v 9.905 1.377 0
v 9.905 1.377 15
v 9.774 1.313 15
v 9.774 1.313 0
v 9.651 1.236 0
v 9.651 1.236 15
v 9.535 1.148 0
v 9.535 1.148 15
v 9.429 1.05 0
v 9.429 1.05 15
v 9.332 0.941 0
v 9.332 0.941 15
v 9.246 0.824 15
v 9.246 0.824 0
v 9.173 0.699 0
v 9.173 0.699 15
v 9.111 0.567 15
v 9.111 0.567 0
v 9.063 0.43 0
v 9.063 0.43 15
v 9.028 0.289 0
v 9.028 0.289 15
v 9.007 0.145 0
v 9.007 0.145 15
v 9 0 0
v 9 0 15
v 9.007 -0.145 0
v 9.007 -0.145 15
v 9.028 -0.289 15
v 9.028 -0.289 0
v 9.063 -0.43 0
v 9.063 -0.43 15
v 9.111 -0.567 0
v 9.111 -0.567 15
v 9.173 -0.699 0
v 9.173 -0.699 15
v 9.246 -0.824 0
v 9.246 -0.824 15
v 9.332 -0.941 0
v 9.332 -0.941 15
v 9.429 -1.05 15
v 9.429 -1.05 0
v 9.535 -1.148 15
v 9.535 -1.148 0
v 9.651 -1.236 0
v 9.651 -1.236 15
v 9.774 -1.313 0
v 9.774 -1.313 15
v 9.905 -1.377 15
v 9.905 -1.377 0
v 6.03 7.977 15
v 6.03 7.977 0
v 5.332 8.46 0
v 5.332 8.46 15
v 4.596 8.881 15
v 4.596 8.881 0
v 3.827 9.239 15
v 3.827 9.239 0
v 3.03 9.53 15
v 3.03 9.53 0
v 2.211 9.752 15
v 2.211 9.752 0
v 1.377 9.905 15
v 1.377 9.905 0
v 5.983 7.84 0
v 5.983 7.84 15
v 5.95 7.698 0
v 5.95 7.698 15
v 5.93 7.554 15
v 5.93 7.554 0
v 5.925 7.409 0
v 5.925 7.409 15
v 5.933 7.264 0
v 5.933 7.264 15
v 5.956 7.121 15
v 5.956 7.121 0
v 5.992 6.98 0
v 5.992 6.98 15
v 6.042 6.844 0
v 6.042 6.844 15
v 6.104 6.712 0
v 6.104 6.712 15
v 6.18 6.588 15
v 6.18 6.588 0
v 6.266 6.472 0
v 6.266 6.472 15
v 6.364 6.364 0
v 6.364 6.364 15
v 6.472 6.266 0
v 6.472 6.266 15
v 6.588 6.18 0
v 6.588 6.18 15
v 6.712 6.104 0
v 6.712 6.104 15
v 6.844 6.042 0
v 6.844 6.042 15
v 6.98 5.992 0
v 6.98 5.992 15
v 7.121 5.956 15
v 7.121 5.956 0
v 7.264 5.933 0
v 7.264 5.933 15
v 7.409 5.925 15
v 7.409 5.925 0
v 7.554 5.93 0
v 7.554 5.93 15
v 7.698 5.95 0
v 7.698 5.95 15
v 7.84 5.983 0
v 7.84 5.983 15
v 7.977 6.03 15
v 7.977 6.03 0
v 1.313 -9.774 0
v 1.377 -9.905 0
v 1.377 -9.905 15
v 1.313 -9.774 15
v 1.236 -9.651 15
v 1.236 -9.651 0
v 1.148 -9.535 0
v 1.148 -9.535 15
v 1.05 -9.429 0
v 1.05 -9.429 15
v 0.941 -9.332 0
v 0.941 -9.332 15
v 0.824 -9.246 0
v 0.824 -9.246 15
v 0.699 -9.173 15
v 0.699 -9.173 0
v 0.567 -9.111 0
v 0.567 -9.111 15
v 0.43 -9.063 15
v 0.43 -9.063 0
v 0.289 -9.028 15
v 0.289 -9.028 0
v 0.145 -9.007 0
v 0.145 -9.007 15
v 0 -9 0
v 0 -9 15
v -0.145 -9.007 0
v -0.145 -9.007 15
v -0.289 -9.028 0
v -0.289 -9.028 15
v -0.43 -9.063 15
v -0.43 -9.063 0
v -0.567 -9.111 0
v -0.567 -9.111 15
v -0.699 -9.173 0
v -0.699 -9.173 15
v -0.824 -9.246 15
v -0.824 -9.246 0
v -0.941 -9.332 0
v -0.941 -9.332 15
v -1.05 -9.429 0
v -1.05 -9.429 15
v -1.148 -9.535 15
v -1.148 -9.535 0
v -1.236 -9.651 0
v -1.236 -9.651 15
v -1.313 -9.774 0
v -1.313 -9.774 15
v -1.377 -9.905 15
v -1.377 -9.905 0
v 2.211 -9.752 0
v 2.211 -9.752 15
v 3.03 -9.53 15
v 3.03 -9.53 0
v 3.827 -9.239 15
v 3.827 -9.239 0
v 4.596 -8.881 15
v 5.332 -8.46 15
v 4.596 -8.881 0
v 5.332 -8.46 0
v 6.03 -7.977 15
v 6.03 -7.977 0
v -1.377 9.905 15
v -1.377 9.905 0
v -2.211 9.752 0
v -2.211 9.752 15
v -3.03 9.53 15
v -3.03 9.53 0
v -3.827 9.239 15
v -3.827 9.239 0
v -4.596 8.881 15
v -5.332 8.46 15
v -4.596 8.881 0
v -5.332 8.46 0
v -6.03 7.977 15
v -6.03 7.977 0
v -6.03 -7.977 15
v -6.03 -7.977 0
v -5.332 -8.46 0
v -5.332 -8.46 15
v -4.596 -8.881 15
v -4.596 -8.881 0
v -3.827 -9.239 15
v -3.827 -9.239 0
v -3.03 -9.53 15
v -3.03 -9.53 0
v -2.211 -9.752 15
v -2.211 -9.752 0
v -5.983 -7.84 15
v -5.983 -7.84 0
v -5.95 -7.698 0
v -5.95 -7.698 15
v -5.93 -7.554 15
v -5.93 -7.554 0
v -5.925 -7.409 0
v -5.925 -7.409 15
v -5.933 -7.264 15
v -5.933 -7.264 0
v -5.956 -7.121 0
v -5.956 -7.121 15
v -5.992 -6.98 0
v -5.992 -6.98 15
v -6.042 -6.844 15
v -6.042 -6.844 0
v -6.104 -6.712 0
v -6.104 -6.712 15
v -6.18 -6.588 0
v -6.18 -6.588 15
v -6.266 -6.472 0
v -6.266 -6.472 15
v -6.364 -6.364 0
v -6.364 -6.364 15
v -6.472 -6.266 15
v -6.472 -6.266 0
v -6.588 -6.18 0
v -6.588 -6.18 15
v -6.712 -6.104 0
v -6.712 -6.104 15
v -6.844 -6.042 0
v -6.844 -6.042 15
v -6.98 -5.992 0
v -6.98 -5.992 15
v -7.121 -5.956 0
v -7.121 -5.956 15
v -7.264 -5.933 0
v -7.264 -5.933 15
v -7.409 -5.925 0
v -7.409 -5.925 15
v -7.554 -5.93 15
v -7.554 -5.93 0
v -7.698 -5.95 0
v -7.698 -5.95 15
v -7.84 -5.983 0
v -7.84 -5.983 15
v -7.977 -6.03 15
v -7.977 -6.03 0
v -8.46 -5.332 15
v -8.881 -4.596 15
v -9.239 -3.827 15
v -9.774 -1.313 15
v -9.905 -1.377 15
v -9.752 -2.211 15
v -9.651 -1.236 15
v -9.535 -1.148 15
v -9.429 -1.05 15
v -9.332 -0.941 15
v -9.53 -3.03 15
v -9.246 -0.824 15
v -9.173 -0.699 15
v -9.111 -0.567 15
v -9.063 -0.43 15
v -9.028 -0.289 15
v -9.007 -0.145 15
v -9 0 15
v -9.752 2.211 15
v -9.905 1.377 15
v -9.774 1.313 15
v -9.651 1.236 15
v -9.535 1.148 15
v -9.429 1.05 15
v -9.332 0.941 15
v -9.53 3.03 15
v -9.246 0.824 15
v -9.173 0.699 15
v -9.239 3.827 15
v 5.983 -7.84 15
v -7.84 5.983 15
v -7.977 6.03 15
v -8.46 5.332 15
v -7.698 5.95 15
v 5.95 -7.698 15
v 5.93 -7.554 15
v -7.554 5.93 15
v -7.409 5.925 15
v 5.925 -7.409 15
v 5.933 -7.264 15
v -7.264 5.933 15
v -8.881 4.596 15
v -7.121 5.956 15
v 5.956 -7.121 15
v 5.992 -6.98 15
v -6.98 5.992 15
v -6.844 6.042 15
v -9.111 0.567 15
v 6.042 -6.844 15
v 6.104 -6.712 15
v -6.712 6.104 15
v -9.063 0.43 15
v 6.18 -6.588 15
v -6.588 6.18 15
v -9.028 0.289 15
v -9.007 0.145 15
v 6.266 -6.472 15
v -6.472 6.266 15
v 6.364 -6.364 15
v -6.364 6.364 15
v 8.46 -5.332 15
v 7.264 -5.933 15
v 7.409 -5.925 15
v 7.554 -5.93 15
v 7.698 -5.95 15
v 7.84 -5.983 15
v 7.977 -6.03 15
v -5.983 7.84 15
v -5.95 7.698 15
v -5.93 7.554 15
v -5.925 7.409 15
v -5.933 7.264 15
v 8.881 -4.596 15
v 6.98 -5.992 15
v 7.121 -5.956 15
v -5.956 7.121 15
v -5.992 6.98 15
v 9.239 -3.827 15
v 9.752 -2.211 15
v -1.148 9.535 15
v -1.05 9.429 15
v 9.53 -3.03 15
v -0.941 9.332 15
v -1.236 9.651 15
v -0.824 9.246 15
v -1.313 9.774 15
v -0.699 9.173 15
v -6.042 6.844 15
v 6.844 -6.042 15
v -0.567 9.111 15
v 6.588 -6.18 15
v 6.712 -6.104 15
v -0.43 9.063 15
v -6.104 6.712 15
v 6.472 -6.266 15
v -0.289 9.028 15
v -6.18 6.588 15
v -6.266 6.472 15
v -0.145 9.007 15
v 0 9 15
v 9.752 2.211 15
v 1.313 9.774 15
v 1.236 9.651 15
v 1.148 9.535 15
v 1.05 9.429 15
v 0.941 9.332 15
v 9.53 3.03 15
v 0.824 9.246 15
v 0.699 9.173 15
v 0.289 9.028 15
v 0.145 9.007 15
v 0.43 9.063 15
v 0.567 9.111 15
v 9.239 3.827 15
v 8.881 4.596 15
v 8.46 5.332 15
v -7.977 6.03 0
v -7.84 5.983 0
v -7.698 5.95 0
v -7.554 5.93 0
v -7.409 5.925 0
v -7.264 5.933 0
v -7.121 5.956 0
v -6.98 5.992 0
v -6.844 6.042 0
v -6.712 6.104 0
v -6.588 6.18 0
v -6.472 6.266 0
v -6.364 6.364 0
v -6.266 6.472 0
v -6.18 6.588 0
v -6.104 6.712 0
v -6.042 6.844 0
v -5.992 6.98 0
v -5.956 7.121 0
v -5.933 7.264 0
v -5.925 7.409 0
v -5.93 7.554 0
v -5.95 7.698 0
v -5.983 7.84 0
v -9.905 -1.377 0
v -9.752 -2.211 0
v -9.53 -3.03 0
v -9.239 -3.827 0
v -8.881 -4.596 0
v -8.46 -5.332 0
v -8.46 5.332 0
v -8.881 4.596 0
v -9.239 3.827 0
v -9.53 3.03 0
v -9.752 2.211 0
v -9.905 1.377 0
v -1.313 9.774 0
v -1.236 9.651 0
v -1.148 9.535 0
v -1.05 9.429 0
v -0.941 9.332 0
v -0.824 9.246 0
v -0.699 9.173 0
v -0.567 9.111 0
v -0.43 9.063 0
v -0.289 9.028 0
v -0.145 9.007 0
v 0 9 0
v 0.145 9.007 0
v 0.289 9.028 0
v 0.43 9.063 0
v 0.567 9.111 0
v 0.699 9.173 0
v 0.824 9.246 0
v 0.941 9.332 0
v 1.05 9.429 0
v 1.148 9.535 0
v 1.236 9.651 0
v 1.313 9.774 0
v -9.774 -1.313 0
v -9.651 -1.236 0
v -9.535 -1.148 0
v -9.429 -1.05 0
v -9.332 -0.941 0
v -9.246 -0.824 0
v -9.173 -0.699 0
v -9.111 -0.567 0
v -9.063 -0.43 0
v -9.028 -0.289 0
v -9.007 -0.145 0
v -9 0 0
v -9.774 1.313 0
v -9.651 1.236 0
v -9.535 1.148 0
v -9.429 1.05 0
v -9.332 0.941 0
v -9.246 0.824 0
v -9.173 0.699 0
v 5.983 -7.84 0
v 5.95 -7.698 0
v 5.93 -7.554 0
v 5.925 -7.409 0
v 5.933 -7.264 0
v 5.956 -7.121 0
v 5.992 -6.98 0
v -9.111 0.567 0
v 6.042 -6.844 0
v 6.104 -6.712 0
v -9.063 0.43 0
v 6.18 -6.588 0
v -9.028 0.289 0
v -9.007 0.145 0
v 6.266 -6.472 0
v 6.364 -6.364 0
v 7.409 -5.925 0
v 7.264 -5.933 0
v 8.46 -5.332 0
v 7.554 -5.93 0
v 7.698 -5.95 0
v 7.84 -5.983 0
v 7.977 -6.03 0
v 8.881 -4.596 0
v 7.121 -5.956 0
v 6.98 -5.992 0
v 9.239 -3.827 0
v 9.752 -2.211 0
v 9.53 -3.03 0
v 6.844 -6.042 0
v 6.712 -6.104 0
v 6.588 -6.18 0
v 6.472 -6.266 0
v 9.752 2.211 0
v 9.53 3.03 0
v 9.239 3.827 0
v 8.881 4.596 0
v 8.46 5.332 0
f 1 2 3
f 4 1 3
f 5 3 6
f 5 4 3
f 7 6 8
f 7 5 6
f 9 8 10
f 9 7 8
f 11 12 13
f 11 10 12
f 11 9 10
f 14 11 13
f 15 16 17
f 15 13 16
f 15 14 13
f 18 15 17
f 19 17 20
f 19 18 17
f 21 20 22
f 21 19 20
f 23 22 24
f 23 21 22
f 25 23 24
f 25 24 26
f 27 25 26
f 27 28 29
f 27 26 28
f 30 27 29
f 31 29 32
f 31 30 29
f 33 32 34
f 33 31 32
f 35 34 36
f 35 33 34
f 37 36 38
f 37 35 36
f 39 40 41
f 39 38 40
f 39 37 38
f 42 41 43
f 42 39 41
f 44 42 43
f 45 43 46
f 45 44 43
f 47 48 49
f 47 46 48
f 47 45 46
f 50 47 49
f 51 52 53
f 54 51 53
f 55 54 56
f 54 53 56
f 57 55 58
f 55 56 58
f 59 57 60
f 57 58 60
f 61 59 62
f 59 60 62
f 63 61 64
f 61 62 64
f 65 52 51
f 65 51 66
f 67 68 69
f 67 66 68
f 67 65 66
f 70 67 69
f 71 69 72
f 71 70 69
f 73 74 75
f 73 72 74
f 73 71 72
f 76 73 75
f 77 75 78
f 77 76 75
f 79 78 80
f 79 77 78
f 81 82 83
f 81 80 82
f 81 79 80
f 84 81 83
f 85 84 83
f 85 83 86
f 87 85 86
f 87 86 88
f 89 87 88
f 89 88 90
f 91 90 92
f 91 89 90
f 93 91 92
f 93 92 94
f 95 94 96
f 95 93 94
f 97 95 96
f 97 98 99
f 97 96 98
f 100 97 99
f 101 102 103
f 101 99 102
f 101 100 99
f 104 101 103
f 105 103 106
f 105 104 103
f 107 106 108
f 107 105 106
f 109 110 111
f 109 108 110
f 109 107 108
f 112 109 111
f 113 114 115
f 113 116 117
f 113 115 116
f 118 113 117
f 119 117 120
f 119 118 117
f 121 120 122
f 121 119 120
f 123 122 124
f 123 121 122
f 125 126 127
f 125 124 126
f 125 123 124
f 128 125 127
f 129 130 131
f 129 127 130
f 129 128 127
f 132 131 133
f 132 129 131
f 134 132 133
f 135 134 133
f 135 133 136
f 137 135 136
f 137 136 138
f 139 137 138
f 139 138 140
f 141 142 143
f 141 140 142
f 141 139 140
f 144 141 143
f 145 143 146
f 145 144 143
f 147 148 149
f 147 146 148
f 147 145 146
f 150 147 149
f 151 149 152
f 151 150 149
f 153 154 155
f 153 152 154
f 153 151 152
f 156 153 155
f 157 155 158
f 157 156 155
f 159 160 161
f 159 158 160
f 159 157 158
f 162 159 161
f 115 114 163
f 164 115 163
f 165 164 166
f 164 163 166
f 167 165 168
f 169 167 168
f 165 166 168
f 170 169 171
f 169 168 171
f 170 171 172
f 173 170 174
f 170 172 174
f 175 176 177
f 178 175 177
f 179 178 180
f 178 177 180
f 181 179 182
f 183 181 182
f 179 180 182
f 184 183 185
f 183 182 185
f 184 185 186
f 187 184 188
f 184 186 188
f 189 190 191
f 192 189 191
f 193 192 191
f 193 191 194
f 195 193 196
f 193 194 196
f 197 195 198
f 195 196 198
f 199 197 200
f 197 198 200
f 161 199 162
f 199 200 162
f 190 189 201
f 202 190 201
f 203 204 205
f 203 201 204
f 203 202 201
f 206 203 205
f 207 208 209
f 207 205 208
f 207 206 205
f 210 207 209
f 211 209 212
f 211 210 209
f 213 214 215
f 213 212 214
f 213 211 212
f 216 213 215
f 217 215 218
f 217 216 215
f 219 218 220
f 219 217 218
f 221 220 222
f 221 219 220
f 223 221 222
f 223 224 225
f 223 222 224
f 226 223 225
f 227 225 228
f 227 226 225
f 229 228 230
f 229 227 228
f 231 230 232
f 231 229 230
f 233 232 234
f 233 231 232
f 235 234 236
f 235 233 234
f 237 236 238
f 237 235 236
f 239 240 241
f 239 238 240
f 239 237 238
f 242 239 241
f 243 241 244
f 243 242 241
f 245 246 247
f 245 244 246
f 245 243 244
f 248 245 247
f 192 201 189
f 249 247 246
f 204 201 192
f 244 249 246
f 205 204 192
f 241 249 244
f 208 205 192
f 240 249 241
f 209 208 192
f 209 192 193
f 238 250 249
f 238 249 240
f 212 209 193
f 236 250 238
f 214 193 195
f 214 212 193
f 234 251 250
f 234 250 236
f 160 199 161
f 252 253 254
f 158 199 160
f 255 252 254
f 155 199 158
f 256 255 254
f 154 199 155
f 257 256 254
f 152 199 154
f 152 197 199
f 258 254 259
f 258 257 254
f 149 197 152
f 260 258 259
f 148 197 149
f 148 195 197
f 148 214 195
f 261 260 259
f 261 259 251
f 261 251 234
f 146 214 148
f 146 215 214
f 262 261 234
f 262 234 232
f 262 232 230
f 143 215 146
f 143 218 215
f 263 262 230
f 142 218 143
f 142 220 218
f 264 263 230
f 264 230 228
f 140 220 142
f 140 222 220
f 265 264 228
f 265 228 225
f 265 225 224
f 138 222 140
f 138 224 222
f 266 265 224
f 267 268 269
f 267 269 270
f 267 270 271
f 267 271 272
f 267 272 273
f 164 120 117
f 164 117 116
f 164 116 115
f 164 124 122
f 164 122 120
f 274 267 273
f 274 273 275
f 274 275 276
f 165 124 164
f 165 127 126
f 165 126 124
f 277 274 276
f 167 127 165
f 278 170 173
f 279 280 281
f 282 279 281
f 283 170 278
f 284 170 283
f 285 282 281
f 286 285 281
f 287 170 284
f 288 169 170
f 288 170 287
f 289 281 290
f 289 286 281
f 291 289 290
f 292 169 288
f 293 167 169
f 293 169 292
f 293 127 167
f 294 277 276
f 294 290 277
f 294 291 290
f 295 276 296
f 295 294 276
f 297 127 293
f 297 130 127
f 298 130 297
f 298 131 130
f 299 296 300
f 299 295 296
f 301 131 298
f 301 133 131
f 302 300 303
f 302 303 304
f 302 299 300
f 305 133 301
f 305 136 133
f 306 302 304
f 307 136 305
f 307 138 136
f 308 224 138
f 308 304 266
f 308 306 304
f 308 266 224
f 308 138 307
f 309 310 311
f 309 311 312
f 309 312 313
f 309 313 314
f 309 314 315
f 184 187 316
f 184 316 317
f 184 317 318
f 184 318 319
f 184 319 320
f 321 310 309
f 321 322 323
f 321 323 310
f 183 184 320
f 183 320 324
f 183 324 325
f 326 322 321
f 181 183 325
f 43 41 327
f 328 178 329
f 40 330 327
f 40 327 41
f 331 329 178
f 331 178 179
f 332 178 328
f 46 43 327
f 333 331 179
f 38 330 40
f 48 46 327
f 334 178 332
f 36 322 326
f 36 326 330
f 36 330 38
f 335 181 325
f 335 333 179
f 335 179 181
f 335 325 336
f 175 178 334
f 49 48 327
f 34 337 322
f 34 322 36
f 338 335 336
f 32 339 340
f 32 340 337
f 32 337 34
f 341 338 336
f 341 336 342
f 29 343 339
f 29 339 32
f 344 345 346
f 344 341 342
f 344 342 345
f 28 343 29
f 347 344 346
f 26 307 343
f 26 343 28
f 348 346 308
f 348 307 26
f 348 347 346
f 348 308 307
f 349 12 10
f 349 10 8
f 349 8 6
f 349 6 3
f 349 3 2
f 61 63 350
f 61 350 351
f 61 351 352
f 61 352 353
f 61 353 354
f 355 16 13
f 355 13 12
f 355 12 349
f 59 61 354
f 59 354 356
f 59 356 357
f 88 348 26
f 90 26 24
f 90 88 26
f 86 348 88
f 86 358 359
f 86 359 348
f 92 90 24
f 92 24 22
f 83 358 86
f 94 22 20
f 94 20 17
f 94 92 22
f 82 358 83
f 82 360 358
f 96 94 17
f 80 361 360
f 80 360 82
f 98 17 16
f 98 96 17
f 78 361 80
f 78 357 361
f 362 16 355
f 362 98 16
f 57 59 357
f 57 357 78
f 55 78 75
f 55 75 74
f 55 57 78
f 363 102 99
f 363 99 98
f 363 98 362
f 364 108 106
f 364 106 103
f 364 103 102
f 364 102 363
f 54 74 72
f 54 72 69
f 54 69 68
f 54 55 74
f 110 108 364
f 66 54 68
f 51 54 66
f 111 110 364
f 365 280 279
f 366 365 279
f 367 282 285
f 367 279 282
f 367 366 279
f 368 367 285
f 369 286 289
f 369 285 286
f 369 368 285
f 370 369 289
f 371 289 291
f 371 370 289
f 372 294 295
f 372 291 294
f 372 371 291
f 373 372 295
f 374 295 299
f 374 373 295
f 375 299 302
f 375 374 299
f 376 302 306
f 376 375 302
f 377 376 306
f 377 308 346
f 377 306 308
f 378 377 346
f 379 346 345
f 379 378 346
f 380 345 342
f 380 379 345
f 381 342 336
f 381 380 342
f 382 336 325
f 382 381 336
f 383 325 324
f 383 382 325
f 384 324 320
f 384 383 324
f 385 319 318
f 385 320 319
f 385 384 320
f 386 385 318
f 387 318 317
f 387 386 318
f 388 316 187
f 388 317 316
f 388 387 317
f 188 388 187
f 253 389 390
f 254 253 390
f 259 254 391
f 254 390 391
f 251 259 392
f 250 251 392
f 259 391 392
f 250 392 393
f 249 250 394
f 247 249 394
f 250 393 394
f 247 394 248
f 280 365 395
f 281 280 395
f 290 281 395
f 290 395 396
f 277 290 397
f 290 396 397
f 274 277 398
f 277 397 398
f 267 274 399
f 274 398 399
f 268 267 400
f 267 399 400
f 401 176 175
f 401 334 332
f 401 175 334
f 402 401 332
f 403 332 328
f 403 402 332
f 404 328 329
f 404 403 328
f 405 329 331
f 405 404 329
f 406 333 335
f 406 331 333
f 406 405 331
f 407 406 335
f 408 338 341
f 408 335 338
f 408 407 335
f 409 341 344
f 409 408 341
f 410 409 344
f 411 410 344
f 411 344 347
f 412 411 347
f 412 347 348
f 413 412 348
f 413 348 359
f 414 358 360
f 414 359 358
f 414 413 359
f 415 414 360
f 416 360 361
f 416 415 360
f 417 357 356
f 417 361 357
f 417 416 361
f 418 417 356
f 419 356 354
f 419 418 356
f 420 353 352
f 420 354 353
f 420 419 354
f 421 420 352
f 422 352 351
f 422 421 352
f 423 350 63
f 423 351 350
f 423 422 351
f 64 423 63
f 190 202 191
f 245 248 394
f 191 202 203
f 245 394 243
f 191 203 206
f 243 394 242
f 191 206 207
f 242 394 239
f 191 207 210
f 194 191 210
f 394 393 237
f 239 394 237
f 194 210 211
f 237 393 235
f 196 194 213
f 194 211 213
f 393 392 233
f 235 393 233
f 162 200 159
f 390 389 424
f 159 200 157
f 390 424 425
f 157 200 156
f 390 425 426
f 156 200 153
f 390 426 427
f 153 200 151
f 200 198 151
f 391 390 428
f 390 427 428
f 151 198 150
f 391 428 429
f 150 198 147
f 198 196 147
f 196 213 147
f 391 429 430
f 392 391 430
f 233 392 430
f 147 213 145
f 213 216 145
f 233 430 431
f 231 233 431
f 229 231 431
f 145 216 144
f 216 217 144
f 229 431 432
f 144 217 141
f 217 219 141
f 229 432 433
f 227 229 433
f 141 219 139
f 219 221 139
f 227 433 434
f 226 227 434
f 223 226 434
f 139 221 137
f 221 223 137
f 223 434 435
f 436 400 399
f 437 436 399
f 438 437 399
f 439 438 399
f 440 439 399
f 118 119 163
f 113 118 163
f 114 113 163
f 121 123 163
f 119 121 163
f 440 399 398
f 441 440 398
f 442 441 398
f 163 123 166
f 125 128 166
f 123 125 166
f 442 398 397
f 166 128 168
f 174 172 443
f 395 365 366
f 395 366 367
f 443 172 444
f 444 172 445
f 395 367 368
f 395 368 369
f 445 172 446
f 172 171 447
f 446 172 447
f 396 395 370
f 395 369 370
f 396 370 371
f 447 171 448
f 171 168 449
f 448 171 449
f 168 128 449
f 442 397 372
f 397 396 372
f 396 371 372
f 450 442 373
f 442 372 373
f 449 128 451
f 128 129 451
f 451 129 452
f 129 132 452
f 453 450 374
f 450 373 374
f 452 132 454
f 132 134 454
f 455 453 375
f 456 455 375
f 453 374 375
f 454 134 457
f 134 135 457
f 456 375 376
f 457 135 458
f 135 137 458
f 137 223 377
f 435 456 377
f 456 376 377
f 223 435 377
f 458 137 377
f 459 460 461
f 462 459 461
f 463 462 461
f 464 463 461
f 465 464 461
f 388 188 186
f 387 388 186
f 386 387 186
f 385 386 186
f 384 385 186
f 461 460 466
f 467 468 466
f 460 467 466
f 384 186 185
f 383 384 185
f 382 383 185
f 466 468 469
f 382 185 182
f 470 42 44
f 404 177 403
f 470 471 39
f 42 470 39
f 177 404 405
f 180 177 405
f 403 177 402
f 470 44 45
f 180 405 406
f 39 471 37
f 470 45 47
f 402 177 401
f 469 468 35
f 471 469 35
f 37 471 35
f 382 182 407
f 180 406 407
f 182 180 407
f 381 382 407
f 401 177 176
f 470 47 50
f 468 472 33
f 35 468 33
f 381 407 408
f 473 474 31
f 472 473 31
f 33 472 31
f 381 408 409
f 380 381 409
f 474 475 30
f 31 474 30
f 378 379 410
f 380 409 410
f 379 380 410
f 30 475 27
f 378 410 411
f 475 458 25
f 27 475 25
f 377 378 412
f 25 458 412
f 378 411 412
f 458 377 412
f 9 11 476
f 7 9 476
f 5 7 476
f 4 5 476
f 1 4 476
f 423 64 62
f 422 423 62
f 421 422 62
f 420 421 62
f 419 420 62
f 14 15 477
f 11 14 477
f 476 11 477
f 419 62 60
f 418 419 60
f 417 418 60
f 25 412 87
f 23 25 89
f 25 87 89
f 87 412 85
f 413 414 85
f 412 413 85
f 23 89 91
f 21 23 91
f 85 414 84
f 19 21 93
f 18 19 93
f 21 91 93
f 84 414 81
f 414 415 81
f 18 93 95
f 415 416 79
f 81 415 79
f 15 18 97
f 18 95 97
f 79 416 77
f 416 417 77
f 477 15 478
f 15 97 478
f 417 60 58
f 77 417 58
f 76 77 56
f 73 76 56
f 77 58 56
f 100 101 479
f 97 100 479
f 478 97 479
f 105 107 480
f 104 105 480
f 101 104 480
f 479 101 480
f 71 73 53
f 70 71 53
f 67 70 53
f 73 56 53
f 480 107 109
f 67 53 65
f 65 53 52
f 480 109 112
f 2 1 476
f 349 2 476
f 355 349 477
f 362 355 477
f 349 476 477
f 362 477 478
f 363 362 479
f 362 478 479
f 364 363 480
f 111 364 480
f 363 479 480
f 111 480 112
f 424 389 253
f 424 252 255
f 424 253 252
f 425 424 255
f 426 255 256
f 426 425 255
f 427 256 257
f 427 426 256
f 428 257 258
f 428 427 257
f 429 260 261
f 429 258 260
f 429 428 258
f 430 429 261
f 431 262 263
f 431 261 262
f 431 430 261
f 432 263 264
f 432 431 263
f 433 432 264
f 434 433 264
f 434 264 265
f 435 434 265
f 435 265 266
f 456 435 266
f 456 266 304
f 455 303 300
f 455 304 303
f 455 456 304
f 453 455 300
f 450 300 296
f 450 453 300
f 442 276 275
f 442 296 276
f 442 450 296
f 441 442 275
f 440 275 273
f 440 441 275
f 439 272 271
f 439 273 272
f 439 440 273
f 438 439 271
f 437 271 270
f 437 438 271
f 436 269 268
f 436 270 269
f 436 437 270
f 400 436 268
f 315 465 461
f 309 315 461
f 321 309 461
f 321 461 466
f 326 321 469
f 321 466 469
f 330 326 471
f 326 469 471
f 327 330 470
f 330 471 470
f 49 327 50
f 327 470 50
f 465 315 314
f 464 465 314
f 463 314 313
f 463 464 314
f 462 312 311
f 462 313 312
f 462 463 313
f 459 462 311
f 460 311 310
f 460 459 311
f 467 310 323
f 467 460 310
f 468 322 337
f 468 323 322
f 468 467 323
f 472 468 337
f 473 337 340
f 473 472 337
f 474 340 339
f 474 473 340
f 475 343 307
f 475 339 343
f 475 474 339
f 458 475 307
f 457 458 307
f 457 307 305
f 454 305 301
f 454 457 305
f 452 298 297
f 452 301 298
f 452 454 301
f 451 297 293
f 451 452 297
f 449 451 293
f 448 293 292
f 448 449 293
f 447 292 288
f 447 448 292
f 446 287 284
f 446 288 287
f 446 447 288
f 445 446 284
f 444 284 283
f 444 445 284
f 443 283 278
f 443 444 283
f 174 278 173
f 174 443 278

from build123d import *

# Parameters (mm, degrees)
CYLINDER001_R     = 1.5
CYLINDER001_DEPTH = 20
ARRAY_COUNT       = 8
CYLINDER_R        = 10
CYLINDER_DEPTH    = 15


with BuildPart() as array:
    # Cylinder001 → Cylinder001 (new body)
    with BuildSketch(Plane(origin=(10.5, 0, -2), x_dir=(1, 0, 0), z_dir=(0, 0, 1))):
        Circle(CYLINDER001_R)
    extrude(amount=CYLINDER001_DEPTH)

    # Array: Array ×8 about axis
    array_axis = Axis((0, 0, 1), (0, 0, 1))


with BuildPart() as array_1:
    add(array.part)
    for i in range(1, ARRAY_COUNT):
        add(array.part.rotate(array_axis, i * 360 / ARRAY_COUNT))


with BuildPart() as buttom:
    # Cylinder → Cylinder (new body)
    with BuildSketch(Plane.XY):
        Circle(CYLINDER_R)
    extrude(amount=CYLINDER_DEPTH)

    # Cut: cut Array
    add(array_1.part, mode=Mode.SUBTRACT)


solid = buttom.part
